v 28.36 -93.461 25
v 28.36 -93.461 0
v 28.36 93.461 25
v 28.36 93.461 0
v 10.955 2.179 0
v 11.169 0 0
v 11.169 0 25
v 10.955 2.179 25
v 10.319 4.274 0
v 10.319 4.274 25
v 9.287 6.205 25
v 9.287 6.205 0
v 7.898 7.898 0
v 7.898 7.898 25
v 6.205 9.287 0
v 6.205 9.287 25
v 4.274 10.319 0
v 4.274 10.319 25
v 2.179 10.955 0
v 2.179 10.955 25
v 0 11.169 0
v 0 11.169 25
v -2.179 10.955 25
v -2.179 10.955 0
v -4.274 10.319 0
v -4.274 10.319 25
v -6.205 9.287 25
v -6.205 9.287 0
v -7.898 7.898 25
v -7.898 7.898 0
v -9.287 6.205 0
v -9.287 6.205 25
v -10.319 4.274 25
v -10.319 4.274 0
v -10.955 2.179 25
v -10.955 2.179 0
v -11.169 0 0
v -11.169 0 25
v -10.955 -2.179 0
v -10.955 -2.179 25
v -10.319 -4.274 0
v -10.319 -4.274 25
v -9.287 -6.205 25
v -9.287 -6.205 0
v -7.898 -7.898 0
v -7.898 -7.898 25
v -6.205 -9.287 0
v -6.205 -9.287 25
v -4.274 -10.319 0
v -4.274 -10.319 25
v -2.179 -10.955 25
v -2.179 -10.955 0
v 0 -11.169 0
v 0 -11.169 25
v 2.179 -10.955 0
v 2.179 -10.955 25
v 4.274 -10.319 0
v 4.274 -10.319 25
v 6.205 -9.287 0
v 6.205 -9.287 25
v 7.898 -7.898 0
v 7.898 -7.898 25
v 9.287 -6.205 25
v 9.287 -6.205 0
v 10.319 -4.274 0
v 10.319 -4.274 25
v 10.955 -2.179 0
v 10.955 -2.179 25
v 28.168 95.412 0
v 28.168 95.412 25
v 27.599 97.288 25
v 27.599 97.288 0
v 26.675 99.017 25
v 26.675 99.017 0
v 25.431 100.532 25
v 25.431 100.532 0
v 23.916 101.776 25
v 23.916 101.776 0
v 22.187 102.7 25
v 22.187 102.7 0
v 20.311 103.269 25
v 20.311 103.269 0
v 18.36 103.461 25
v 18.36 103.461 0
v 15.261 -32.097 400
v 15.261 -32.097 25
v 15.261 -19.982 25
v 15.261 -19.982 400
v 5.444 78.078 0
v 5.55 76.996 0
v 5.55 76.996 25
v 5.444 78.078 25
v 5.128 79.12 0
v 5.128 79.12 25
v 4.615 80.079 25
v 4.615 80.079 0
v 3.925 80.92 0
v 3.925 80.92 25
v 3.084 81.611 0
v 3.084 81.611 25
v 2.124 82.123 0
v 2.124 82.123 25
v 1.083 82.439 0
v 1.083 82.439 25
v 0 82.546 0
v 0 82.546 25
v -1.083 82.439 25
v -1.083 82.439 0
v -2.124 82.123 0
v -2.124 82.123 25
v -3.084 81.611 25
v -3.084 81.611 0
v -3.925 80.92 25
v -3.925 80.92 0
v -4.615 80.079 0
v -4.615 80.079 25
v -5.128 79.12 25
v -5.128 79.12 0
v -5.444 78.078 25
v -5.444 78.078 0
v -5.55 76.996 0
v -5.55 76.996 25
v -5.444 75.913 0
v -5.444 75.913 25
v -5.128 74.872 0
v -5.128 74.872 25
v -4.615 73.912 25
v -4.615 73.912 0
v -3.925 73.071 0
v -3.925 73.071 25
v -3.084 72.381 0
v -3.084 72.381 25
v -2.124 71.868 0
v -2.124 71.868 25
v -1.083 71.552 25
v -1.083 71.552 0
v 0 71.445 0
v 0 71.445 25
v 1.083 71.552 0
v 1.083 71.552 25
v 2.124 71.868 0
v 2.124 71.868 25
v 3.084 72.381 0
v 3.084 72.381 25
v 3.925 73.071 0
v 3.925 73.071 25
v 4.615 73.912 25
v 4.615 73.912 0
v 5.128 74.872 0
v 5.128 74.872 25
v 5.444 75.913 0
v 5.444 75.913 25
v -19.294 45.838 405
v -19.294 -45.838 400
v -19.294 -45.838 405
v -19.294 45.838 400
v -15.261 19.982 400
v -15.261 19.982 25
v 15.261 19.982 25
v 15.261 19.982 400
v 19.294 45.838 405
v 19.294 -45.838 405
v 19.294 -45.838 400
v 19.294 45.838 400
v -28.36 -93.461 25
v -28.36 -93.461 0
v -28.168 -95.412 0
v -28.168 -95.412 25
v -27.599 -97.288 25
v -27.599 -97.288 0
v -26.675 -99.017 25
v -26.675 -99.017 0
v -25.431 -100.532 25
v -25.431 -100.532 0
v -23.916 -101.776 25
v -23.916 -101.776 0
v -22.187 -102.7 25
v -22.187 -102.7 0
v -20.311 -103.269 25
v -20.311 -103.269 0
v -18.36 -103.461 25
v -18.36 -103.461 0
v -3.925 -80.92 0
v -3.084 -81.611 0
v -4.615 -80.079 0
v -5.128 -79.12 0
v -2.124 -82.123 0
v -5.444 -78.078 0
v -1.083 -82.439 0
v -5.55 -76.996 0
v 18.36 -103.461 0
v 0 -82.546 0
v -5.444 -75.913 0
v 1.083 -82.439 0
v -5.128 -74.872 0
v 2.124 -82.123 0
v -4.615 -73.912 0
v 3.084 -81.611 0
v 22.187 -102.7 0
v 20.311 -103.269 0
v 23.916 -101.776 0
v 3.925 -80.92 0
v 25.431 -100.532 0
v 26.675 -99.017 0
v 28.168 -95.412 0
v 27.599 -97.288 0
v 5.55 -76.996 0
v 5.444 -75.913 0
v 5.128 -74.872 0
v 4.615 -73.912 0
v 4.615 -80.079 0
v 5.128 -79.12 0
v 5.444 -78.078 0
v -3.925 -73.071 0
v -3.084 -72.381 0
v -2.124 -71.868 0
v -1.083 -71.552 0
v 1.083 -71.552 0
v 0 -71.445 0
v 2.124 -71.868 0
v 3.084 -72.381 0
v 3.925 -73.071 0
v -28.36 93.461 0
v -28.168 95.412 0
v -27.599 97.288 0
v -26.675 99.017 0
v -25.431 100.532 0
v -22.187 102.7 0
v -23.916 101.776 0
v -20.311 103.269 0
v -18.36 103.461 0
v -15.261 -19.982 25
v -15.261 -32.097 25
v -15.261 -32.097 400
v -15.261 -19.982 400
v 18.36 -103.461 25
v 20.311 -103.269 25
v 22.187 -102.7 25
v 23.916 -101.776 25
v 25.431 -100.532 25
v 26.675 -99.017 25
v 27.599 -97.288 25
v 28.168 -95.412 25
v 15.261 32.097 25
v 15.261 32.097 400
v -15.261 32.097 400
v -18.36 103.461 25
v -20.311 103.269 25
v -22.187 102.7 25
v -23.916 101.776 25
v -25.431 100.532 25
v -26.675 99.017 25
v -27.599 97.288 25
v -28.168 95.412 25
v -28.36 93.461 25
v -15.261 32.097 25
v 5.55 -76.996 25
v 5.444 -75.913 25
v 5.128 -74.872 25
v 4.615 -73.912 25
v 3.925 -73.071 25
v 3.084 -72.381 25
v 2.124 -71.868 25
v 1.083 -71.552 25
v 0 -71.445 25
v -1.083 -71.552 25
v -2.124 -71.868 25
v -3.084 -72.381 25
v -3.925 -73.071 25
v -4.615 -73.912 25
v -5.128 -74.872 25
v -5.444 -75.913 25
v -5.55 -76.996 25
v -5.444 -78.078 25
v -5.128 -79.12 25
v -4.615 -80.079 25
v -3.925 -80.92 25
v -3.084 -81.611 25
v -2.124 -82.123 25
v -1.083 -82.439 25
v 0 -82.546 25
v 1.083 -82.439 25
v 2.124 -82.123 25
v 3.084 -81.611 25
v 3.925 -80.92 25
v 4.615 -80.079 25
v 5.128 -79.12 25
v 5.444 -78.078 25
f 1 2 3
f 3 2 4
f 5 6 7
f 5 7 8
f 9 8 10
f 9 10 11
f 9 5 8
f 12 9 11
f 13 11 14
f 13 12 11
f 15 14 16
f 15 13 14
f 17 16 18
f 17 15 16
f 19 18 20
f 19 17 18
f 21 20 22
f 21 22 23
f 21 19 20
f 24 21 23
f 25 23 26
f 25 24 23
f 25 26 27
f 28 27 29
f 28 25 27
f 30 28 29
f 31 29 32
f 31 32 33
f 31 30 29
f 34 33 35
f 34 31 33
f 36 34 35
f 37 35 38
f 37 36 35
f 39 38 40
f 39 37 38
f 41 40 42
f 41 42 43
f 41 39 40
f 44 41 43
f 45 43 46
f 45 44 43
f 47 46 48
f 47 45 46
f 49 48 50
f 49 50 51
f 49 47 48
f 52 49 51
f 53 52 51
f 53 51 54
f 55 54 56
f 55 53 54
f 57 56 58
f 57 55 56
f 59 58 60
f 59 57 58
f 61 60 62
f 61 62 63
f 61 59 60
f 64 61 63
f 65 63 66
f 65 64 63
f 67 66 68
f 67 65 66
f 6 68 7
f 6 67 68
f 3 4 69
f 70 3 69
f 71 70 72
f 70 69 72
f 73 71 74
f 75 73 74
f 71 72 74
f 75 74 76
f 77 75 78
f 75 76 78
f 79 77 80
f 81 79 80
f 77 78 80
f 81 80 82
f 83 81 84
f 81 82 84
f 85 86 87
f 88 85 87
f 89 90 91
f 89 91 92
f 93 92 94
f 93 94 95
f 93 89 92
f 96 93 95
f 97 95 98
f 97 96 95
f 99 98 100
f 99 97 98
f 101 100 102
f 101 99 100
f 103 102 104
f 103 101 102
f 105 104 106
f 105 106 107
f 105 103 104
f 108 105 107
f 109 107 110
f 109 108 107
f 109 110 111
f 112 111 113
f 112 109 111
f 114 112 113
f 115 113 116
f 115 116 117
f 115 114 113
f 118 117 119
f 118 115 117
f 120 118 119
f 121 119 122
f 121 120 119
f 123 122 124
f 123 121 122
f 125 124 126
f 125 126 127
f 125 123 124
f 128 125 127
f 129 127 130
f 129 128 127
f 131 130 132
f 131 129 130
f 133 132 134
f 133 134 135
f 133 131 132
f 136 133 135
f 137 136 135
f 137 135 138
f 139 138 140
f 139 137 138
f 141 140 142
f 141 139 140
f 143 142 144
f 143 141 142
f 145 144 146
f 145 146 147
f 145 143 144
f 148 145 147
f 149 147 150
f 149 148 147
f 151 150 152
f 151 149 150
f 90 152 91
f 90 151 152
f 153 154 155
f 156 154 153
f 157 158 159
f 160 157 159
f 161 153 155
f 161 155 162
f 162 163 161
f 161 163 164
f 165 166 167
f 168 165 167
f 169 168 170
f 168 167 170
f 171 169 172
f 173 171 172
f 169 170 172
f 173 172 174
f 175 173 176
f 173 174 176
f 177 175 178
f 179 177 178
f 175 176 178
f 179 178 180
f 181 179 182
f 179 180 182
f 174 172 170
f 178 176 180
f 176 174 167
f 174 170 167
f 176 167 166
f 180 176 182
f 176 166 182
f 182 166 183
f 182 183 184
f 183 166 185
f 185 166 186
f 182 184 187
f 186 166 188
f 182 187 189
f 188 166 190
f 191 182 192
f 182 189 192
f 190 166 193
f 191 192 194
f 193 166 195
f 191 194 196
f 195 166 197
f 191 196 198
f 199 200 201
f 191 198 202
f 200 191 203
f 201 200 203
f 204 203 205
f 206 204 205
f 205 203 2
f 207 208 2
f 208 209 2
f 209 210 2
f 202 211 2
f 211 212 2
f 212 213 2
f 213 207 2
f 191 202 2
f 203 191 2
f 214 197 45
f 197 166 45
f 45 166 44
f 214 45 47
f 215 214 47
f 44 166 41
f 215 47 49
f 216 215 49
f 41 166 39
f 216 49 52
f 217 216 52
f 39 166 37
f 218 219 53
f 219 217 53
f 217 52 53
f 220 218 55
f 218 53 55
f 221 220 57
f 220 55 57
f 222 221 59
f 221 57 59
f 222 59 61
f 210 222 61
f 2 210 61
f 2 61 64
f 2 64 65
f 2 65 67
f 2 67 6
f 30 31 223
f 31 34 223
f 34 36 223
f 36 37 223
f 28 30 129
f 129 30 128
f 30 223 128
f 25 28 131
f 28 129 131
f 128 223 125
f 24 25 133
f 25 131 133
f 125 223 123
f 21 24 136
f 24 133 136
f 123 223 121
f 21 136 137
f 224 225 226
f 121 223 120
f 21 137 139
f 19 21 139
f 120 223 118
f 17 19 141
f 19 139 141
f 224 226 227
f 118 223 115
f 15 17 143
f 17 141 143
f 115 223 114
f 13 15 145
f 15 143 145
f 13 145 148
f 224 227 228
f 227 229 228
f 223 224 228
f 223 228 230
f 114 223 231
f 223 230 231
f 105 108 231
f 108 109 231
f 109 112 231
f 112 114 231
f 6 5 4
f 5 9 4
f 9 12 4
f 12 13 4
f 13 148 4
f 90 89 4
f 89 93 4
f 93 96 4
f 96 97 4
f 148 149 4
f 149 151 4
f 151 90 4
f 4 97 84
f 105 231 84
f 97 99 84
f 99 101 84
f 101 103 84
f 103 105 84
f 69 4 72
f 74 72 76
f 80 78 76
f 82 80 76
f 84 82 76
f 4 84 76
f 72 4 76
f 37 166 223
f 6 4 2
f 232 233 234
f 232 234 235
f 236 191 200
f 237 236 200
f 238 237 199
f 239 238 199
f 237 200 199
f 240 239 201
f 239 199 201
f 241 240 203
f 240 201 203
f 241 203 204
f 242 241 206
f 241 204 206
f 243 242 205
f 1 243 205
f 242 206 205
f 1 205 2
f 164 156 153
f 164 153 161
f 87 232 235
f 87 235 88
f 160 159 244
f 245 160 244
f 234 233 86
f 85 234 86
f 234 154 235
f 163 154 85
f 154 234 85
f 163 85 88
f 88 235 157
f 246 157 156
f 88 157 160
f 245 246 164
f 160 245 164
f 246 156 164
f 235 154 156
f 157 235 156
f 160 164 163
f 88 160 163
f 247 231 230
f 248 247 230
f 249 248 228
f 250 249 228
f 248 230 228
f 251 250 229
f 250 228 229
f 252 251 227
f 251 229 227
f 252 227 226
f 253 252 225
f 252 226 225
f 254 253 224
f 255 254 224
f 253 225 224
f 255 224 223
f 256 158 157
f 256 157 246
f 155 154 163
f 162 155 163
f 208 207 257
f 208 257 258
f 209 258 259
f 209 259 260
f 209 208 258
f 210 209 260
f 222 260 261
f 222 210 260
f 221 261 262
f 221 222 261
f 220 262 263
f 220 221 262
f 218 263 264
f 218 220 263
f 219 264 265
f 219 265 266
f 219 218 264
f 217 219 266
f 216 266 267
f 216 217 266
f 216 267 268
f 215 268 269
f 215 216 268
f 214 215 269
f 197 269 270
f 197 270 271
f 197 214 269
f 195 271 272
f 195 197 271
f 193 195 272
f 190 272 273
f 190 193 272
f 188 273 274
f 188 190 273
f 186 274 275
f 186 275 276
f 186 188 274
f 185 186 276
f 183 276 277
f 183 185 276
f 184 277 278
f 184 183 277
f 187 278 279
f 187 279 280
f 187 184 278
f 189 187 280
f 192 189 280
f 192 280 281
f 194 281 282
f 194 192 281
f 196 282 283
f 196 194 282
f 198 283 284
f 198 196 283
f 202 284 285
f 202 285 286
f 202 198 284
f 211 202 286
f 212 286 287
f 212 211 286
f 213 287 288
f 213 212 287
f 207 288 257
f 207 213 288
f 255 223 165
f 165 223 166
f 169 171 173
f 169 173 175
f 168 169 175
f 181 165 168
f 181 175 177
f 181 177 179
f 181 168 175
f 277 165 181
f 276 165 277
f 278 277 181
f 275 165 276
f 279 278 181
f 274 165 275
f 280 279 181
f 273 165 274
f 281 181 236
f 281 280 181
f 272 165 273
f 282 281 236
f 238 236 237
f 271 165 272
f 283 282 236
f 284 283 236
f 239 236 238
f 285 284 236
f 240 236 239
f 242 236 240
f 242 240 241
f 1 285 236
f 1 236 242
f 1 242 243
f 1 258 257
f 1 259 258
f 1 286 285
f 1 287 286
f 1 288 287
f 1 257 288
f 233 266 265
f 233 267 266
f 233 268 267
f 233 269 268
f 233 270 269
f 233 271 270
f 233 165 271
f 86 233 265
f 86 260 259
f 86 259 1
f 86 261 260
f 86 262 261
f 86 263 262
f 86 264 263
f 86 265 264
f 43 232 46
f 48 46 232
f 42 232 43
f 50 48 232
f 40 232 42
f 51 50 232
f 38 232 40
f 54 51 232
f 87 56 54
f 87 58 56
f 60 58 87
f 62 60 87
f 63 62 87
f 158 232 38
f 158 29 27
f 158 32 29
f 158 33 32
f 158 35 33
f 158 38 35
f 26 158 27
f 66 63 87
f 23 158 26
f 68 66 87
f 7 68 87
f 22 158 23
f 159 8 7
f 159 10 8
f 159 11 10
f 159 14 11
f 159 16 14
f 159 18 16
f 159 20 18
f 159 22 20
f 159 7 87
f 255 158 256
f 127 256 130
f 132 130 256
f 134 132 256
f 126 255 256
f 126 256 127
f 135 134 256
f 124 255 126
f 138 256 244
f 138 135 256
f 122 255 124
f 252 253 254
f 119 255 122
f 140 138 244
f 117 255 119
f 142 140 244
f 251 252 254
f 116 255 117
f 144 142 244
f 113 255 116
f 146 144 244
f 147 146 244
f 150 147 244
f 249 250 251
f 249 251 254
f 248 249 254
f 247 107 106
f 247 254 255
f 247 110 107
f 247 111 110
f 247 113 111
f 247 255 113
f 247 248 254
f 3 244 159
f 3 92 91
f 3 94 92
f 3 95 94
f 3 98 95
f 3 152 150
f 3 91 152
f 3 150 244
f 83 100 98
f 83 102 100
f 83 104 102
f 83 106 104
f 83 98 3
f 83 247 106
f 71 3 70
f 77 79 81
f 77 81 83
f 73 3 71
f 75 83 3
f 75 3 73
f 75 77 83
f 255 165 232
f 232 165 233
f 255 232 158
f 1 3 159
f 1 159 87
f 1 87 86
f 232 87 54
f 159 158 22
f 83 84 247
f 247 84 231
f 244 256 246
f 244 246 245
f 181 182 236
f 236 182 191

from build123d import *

# Parameters (mm, degrees)
F0_R     = 5.550353
F0_W     = 30.522084
F0_H     = 12.115386
F0_R_2   = 11.169447
F1_DEPTH = 25
F2_DEPTH = 400
F3_W     = 38.587202
F3_H     = 91.675318
F4_DEPTH = 5


with BuildPart() as f1:
    # F0 (on Top) → F1 (new body)
    with BuildSketch(Plane.XY):
        with BuildLine():
            ThreePointArc((28.360015, 93.460975), (25.431083, 100.532043), (18.360015, 103.460975))
            Line((18.360015, 103.460975), (-18.360015, 103.460975))
            ThreePointArc((-18.360015, 103.460975), (-25.431083, 100.532043), (-28.360015, 93.460975))
            Line((-28.360015, 93.460975), (-28.360015, -93.460975))
            ThreePointArc((-28.360015, -93.460975), (-25.431083, -100.532043), (-18.360015, -103.460975))
            Line((-18.360015, -103.460975), (18.360015, -103.460975))
            ThreePointArc((18.360015, -103.460975), (25.431083, -100.532043), (28.360015, -93.460975))
            Line((28.360015, -93.460975), (28.360015, 93.460975))
        make_face()
        with Locations((0, -76.995626)):
            Circle(F0_R, mode=Mode.SUBTRACT)
        with Locations((0, -26.03974)):
            Rectangle(F0_W, F0_H, mode=Mode.SUBTRACT)
        Circle(F0_R_2, mode=Mode.SUBTRACT)
        with Locations((0, 26.03974)):
            Rectangle(F0_W, F0_H, mode=Mode.SUBTRACT)
        with Locations((0, 76.995626)):
            Circle(F0_R, mode=Mode.SUBTRACT)
        with Locations((0, -26.03974)):
            Rectangle(F0_W, F0_H)
        with Locations((0, 26.03974)):
            Rectangle(F0_W, F0_H)
    extrude(amount=F1_DEPTH)

    # F0 (on Top) → F2 (join)
    with BuildSketch(Plane.XY):
        with Locations((0, -26.03974)):
            Rectangle(F0_W, F0_H)
        with Locations((0, 26.03974)):
            Rectangle(F0_W, F0_H)
    extrude(amount=F2_DEPTH)

    # F3 (on face) → F4 (join)
    with BuildSketch(Plane.XY.offset(400)):
        Rectangle(F3_W, F3_H)
    extrude(amount=F4_DEPTH)


solid = f1.part
